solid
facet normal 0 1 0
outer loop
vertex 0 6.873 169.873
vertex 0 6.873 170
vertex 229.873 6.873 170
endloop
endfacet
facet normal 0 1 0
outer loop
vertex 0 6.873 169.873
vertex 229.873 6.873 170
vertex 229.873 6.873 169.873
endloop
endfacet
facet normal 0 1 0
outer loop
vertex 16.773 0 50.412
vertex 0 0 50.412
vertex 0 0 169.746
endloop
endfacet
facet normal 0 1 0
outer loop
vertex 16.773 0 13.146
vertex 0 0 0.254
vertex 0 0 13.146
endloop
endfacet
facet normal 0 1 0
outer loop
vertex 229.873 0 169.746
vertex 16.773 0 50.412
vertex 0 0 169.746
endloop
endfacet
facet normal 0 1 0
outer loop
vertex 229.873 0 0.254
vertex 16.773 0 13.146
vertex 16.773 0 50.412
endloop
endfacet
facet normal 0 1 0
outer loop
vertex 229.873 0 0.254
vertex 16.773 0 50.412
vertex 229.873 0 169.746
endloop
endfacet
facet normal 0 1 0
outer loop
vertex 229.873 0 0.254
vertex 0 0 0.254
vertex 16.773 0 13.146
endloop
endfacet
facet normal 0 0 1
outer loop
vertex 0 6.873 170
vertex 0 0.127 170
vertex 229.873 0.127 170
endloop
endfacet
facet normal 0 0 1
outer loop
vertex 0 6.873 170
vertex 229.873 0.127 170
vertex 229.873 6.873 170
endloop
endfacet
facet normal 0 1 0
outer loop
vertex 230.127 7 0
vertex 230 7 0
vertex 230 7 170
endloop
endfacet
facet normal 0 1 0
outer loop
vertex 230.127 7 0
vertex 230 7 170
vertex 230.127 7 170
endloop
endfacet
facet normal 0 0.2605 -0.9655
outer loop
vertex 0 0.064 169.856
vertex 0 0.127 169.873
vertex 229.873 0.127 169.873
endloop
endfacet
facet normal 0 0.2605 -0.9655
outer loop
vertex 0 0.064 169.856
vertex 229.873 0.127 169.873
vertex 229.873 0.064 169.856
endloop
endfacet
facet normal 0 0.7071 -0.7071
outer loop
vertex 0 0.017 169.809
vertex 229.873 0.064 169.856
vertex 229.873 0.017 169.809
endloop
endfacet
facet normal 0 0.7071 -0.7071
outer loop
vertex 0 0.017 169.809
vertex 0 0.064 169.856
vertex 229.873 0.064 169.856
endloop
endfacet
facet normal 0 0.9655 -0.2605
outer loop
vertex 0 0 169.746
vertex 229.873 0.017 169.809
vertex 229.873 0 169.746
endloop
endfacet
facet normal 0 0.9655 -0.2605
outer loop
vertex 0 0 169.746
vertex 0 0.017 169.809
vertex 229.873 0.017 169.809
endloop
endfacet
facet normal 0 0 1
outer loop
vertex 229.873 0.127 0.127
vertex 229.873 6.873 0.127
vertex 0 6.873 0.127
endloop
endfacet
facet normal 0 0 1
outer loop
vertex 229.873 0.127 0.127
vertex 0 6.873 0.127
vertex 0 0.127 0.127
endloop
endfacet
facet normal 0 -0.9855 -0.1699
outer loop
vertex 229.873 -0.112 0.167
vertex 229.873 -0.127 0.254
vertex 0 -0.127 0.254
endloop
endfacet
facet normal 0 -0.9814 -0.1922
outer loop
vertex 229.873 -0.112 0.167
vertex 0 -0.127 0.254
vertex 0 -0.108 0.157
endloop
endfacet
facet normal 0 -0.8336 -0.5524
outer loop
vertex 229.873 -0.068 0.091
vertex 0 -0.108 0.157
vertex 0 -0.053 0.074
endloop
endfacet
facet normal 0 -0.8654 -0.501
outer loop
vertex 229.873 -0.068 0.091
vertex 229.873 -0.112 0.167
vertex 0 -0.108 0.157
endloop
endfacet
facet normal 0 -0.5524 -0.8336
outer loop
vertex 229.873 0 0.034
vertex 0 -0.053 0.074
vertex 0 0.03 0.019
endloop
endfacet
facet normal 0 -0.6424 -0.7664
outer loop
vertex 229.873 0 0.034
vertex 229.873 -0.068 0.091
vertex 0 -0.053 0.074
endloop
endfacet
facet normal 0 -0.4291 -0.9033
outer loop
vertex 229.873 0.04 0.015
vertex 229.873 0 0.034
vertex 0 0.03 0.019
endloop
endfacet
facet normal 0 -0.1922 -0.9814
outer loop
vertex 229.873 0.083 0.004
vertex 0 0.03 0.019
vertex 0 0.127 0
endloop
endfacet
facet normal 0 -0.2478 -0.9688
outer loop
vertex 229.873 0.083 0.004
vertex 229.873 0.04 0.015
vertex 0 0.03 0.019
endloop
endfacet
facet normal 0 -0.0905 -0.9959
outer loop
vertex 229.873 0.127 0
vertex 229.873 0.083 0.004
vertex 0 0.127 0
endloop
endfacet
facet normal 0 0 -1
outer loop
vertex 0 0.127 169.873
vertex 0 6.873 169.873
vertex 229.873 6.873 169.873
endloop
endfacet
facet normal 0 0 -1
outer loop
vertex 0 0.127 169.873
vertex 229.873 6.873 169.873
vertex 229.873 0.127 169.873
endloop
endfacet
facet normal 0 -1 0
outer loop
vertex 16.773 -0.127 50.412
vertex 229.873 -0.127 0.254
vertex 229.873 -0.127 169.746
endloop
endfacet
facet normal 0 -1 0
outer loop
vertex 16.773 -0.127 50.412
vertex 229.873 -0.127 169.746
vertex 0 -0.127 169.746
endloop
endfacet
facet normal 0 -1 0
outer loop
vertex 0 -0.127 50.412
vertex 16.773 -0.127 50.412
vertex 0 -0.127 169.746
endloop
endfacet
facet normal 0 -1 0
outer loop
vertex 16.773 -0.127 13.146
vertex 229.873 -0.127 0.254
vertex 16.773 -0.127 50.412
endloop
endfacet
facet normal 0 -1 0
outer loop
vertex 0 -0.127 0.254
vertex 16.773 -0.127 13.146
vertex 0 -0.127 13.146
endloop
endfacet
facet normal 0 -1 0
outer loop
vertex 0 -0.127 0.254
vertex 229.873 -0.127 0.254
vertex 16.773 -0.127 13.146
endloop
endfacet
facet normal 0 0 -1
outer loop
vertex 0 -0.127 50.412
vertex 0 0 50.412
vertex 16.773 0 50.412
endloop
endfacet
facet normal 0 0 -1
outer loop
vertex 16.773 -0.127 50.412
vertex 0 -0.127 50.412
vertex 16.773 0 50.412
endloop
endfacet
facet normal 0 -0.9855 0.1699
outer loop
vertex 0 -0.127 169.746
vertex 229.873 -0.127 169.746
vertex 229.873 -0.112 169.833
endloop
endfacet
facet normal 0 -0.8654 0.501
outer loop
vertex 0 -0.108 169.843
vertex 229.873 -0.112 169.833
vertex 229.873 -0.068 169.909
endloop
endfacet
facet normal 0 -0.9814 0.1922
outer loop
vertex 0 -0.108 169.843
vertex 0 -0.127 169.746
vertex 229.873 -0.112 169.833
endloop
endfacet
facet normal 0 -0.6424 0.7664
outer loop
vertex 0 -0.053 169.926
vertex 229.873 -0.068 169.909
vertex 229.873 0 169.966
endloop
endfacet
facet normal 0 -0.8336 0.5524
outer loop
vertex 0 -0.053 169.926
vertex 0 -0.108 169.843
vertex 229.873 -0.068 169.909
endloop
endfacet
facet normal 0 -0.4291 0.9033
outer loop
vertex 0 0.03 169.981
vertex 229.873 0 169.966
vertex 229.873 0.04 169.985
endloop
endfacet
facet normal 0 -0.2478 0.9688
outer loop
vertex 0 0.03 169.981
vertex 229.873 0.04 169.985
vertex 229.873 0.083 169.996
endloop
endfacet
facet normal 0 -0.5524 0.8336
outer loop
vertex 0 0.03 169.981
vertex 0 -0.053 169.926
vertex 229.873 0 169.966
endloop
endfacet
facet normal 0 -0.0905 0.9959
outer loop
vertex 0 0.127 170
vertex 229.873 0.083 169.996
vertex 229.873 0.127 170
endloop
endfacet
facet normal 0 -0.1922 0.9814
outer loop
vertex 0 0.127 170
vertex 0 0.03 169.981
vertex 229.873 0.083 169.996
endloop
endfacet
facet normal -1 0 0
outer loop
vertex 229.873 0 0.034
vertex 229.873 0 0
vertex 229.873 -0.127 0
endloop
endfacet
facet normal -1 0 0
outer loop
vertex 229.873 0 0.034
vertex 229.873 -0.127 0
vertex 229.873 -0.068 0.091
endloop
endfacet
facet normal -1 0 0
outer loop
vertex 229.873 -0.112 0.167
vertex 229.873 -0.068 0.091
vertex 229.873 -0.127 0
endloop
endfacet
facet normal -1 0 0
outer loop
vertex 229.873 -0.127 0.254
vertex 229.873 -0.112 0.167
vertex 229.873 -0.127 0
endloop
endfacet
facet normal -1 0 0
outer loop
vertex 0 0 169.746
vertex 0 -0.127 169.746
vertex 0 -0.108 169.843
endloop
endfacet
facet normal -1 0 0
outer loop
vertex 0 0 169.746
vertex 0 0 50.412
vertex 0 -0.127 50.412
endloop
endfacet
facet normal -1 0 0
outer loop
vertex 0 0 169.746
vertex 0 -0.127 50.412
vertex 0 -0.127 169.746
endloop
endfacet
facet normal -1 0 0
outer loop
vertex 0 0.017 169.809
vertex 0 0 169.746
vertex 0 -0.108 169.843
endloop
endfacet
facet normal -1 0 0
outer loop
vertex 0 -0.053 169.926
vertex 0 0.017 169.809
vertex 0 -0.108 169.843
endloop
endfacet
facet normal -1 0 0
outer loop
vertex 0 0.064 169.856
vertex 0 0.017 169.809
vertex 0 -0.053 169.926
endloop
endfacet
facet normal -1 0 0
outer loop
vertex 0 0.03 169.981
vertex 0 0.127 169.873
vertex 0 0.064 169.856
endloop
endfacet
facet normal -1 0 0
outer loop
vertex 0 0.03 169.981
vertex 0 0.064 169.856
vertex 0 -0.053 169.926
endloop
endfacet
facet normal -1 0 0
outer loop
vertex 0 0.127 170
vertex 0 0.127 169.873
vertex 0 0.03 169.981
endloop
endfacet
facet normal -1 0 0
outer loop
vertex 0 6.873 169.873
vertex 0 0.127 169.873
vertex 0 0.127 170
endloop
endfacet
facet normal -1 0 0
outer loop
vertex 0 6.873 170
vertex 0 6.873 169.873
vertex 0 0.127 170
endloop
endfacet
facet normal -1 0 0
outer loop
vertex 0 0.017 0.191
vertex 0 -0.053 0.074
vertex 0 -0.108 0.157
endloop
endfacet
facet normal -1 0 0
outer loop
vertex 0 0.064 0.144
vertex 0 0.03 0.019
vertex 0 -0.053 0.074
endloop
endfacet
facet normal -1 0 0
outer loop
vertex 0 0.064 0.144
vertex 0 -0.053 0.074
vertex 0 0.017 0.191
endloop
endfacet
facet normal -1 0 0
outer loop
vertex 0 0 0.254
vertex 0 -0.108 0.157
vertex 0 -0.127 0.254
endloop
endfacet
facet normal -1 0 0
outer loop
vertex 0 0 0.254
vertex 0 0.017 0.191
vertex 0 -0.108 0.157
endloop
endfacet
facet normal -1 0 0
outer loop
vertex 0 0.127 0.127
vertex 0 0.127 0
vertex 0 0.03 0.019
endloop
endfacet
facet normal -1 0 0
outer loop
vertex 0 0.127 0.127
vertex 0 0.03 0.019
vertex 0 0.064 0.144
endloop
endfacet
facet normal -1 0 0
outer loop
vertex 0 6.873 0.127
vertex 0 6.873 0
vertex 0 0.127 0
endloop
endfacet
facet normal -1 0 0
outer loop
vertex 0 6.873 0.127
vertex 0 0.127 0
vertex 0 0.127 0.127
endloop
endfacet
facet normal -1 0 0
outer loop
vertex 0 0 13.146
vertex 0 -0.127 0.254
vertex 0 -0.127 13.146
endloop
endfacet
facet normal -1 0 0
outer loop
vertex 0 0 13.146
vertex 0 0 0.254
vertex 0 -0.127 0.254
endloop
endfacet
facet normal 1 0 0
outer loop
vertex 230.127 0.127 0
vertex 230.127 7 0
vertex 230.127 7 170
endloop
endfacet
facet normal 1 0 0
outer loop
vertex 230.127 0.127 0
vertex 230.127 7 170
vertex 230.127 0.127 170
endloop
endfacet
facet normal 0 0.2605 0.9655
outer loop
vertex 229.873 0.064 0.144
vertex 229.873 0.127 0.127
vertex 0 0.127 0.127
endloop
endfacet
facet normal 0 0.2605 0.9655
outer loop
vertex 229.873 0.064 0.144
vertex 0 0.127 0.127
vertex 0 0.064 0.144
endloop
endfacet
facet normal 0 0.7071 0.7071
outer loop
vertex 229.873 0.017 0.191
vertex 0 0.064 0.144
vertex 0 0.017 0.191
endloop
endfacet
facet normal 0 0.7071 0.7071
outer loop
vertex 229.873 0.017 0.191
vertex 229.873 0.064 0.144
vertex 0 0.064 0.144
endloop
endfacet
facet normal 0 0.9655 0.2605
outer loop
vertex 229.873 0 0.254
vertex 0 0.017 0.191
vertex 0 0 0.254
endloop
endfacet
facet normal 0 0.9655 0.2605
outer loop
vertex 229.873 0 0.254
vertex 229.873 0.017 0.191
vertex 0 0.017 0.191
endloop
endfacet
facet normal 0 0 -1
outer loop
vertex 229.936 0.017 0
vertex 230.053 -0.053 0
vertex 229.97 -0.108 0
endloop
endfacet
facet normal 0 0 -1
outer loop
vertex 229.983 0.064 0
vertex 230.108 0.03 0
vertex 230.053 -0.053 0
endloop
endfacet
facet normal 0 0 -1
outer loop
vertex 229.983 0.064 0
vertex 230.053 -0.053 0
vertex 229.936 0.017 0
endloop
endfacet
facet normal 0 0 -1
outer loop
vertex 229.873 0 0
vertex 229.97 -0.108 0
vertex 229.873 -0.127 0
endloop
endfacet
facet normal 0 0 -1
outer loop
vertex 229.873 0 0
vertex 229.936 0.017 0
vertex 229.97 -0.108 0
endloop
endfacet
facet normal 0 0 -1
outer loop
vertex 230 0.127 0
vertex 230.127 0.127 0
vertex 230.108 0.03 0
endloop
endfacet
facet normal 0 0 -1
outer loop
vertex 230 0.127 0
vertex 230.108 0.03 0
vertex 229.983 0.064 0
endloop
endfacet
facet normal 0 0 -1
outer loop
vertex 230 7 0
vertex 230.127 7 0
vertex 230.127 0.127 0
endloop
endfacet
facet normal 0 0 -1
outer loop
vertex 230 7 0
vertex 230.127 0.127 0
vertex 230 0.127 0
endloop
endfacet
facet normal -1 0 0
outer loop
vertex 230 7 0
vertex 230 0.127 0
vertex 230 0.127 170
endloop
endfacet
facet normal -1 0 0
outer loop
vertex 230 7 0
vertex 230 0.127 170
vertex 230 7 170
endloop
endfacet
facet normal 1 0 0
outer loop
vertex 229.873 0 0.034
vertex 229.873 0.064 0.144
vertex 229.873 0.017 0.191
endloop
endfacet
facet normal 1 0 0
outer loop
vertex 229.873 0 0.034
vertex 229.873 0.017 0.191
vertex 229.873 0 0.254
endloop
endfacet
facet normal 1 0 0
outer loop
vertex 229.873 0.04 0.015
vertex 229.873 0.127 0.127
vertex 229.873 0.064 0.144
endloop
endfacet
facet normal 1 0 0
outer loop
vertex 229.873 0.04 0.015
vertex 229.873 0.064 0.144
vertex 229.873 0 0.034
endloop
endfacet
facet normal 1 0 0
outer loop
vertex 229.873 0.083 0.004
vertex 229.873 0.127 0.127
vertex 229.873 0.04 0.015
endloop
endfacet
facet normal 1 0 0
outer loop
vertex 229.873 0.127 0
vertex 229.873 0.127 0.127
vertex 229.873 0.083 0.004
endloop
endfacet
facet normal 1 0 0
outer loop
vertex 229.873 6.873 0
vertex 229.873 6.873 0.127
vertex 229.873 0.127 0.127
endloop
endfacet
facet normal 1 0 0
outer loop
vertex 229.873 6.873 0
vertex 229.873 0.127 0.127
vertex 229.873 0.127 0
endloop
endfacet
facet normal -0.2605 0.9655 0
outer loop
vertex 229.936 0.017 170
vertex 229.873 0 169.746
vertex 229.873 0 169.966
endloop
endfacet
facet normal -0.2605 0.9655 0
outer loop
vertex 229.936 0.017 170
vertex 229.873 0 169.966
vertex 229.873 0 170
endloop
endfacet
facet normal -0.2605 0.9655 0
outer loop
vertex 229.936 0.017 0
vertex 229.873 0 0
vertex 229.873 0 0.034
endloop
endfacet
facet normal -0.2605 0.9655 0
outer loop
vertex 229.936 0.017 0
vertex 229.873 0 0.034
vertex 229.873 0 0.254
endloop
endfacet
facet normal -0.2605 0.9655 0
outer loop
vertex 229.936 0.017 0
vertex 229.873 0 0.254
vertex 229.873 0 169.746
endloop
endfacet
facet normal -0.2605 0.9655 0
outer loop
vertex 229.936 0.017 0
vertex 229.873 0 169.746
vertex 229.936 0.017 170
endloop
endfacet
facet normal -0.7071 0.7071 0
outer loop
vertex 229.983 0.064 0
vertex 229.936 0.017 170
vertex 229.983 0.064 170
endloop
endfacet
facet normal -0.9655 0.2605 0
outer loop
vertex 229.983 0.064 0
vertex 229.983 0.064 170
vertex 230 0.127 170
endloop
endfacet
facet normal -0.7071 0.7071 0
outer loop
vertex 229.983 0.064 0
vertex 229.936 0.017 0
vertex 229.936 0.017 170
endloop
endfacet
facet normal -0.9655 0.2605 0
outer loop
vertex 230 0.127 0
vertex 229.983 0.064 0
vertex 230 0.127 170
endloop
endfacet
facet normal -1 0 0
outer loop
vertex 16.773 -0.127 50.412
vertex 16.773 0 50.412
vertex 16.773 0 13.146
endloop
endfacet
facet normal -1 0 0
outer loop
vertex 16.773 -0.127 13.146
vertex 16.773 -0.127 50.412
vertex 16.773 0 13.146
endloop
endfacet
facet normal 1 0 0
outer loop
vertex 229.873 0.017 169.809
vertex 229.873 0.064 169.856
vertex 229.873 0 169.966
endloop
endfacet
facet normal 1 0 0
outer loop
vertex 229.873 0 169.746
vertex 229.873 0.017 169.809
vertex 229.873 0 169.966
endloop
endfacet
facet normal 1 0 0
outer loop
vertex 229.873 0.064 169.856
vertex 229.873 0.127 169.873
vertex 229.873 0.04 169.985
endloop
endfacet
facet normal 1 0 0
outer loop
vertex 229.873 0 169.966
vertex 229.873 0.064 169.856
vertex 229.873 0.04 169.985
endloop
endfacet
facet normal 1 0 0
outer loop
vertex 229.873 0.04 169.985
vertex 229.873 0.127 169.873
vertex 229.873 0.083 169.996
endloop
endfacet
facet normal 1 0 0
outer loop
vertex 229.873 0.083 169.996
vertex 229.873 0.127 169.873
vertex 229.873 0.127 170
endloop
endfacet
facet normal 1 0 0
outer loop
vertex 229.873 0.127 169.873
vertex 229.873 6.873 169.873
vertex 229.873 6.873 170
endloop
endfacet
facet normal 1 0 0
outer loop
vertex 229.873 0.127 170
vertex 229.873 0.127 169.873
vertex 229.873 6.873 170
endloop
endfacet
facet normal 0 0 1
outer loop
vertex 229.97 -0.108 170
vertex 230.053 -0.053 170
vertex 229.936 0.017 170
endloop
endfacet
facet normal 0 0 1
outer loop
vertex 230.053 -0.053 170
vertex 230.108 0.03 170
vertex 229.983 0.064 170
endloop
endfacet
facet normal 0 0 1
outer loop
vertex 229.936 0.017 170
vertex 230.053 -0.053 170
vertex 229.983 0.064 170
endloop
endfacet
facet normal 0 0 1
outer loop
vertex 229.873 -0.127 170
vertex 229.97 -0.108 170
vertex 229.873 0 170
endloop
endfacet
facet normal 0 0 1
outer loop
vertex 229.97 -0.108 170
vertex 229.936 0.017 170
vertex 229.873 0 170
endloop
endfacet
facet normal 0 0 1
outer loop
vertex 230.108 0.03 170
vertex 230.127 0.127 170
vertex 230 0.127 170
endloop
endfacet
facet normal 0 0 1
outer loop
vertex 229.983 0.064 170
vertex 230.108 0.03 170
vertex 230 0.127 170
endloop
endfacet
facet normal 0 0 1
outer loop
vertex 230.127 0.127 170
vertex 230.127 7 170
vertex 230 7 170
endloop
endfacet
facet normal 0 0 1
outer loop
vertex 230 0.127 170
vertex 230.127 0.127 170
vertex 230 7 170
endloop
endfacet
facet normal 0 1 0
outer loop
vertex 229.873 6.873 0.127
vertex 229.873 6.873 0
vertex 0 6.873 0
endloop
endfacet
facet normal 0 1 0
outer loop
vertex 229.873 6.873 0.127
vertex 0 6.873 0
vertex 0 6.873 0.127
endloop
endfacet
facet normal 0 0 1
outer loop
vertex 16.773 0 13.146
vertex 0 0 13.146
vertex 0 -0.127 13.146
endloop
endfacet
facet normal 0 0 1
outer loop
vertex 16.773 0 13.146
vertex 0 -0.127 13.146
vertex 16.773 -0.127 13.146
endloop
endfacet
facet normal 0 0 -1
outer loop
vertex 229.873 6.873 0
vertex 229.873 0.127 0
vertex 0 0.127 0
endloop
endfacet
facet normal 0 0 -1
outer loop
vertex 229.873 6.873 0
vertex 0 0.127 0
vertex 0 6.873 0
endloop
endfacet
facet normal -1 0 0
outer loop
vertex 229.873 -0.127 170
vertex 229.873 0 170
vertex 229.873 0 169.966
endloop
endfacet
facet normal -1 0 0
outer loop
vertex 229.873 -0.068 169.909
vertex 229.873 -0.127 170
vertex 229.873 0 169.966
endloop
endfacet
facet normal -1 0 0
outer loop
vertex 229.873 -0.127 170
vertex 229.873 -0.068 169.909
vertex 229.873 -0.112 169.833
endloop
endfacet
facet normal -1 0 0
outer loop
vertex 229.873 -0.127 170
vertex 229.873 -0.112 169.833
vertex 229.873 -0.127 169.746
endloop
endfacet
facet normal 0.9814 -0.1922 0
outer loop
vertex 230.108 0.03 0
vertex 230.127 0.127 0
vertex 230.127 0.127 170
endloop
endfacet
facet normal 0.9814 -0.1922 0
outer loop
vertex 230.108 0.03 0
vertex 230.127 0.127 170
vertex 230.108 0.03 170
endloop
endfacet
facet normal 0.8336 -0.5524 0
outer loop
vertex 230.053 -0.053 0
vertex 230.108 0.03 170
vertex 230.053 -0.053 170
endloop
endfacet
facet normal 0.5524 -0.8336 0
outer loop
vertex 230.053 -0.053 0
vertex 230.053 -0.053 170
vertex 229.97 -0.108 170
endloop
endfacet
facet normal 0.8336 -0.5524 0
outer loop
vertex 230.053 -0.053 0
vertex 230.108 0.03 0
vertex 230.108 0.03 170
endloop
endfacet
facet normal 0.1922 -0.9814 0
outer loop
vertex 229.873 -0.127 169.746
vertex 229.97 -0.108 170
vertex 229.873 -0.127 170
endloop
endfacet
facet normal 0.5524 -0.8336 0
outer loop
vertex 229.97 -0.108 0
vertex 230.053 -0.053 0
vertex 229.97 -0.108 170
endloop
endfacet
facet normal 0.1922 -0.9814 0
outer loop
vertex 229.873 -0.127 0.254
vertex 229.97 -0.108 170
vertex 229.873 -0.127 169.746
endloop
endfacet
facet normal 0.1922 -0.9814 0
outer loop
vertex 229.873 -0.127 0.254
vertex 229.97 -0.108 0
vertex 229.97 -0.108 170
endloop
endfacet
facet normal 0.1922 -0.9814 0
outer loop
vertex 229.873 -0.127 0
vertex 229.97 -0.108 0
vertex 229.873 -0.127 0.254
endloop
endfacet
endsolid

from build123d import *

# Parameters (mm, degrees)
BASE_FLANGE1_DEPTH             = 170
EDGE_FLANGE1_STRIP_W           = 0.762
EDGE_FLANGE1_STRIP_H           = 0.127
EDGE_FLANGE1_STRIP_CUT_DEPTH   = 229.873
EDGE_FLANGE1_STRIP_2_W         = 0.762
EDGE_FLANGE1_STRIP_2_H         = 0.127
EDGE_FLANGE1_STRIP_CUT_2_DEPTH = 229.873
EDGE_FLANGE1_DEPTH             = 229.873
EDGE_FLANGE1_BEND_DEPTH        = 229.873
SKETCH19_W                     = 16.773112734
SKETCH19_H                     = 37.266497541
CUT_EXTRUDE1_DEPTH             = 10


# Sheet-metal steps are written as plain solids
with BuildPart() as part:
    # Sketch1 → Base-Flange1 (new body)
    with BuildSketch(Plane.XY):
        with BuildLine():
            Line((0, 0), (229.873, 0))
            ThreePointArc((229.873, 0), (229.962802561, 0.037197439), (230, 0.127))
            Line((230, 0.127), (230, 7))
            Line((230, 7), (230.127, 7))
            Line((230.127, 7), (230.127, 0.127))
            ThreePointArc((230.127, 0.127), (230.052605122, -0.052605122), (229.873, -0.127))
            Line((229.873, -0.127), (0, -0.127))
            Line((0, -0.127), (0, 0))
        make_face()
    extrude(amount=BASE_FLANGE1_DEPTH)

    # Edge-Flange1 strip (across the edge) → Edge-Flange1 strip cut (cut)
    with BuildSketch(Plane.ZY.offset(-229.873)):
        with Locations((-0.127, -0.0635)):
            Rectangle(EDGE_FLANGE1_STRIP_W, EDGE_FLANGE1_STRIP_H)
    extrude(amount=EDGE_FLANGE1_STRIP_CUT_DEPTH, mode=Mode.SUBTRACT)

    # Edge-Flange1 strip 2 (across the edge) → Edge-Flange1 strip cut 2 (cut)
    with BuildSketch(Plane(origin=(0, 0, 170), x_dir=(0, 0, -1), z_dir=(1, 0, 0))):
        with Locations((-0.127, -0.0635)):
            Rectangle(EDGE_FLANGE1_STRIP_2_W, EDGE_FLANGE1_STRIP_2_H)
    extrude(amount=EDGE_FLANGE1_STRIP_CUT_2_DEPTH, mode=Mode.SUBTRACT)

    # Edge-Flange1 section (across the edge) → Edge-Flange1 (add)
    with BuildSketch(Plane.ZY.offset(-229.873)):
        with BuildLine():
            Line((0, 0.127), (0, 6.873))
            Line((0, 6.873), (0.127, 6.873))
            Line((0.127, 6.873), (0.127, 0.127))
            ThreePointArc((0.127, 0.127), (0.164197439, 0.037197439), (0.254, 0))
            Line((0.254, 0), (0.254, -0.127))
            ThreePointArc((0.254, -0.127), (0.074394878, -0.052605122), (0, 0.127))
        make_face()
    extrude(amount=EDGE_FLANGE1_DEPTH)

    # Edge-Flange1 section 2 (across the edge) → Edge-Flange1 bend (add)
    with BuildSketch(Plane(origin=(0, 0, 170), x_dir=(0, 0, -1), z_dir=(1, 0, 0))):
        with BuildLine():
            Line((0, 0.127), (0, 6.873))
            Line((0, 6.873), (0.127, 6.873))
            Line((0.127, 6.873), (0.127, 0.127))
            ThreePointArc((0.127, 0.127), (0.164197439, 0.037197439), (0.254, 0))
            Line((0.254, 0), (0.254, -0.127))
            ThreePointArc((0.254, -0.127), (0.074394878, -0.052605122), (0, 0.127))
        make_face()
    extrude(amount=EDGE_FLANGE1_BEND_DEPTH)

    # Sketch19 → Cut-Extrude1 (cut)
    with BuildSketch(Plane(origin=(0, 0, 0), x_dir=(1, 0, 0), z_dir=(0, 1, 0))):
        with Locations((8.386556367, -31.778783199)):
            Rectangle(SKETCH19_W, SKETCH19_H)
    extrude(amount=-CUT_EXTRUDE1_DEPTH, mode=Mode.SUBTRACT)


solid = part.part
